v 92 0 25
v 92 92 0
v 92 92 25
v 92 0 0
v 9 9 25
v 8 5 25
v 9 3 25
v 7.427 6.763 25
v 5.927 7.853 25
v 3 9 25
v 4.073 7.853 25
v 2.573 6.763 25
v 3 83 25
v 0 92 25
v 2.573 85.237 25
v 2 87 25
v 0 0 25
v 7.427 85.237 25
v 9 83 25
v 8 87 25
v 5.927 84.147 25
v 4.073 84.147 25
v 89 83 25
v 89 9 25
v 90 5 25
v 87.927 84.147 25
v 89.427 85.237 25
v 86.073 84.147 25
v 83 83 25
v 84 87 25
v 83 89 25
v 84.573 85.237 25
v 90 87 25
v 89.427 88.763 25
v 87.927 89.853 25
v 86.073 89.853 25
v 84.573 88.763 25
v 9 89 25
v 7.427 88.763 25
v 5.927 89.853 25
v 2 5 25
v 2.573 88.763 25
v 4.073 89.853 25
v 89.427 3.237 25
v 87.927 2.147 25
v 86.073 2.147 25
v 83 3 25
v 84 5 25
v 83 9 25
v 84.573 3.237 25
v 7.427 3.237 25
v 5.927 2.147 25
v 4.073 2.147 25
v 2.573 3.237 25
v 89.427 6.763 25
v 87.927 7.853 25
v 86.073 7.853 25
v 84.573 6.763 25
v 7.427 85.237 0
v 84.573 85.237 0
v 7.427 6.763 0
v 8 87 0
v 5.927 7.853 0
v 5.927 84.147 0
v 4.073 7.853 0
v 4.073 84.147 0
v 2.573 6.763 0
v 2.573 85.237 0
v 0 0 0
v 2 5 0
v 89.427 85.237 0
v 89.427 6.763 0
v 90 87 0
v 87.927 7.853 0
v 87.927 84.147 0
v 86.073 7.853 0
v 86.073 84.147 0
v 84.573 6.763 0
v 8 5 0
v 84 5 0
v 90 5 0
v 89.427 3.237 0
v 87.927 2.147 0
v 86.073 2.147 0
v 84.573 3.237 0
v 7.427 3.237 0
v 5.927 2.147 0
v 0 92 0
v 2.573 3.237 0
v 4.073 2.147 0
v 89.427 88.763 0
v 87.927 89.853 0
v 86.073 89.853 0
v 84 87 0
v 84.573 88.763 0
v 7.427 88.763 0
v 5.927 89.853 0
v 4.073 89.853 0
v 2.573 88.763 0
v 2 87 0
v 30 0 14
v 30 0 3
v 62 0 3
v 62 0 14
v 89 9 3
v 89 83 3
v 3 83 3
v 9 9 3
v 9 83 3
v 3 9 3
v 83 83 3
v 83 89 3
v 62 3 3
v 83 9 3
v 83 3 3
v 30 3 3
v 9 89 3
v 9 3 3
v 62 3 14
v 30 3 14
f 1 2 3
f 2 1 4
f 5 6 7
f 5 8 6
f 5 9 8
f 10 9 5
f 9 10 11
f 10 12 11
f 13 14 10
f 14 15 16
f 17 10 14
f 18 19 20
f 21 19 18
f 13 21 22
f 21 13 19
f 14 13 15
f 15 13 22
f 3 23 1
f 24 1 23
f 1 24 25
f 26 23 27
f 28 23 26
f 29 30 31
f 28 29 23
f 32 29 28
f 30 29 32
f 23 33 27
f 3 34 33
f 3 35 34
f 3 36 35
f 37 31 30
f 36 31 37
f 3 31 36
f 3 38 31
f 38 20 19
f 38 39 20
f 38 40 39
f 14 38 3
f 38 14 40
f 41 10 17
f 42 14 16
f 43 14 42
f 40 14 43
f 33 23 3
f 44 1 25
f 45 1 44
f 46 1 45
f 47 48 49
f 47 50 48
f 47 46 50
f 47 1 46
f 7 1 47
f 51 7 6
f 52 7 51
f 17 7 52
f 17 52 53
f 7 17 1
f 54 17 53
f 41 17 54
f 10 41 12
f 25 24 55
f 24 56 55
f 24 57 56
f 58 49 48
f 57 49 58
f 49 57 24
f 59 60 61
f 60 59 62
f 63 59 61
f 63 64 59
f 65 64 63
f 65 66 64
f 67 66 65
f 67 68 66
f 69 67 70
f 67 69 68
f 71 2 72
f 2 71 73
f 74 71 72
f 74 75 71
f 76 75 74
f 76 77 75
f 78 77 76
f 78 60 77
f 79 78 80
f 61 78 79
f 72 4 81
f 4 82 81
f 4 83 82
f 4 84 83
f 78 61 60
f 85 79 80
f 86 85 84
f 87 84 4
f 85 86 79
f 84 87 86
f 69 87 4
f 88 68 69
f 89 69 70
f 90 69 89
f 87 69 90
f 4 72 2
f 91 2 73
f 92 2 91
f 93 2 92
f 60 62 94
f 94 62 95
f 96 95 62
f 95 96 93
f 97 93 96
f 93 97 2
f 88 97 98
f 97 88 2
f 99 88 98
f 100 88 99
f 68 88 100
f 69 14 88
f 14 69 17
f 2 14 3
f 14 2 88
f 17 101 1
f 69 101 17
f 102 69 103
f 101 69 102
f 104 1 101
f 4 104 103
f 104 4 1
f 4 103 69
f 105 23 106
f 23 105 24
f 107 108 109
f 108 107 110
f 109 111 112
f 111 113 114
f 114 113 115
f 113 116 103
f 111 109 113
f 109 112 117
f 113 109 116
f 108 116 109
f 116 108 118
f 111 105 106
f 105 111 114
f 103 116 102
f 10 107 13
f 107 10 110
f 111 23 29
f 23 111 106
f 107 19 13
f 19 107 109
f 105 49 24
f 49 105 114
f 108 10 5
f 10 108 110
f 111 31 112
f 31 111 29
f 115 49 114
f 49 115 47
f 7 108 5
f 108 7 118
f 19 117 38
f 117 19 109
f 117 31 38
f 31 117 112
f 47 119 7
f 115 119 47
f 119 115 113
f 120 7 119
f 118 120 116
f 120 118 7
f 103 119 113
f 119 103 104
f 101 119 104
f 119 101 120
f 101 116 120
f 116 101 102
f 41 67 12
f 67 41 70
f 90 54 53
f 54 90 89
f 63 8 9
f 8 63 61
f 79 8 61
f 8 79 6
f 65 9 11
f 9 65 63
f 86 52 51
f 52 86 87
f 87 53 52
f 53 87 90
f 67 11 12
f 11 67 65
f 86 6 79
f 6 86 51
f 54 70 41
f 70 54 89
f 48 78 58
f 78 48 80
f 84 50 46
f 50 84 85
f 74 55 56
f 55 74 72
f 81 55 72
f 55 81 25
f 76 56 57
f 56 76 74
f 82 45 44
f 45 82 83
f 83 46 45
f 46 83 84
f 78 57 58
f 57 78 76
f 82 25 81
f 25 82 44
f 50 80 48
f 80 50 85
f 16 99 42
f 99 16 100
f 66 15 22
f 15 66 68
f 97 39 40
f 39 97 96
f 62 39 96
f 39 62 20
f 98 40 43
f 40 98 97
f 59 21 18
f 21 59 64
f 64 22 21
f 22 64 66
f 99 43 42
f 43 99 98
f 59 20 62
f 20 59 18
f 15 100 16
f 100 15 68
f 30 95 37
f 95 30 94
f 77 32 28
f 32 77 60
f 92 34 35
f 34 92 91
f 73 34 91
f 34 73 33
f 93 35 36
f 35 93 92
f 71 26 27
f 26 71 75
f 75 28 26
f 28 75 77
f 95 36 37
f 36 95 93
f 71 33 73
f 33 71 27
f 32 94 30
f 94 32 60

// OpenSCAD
ScrewOffset = 5;
ScrewHole = 3;

BoxEdge = 92;
BoxHeight = 25;
BoxEdgethickness = 3;

//BoxEdgethickness = ScrewOffset + 3;
VentWidgh = 32;
VentHeight = 11;
VentCenter = (BoxEdge - VentWidgh)/2;

boxscrew0 = ScrewOffset;
boxscrew1 = BoxEdge - ScrewOffset;

difference (){
    //cube([x,y,z], center = true/false);
    cube([BoxEdge,BoxEdge,BoxHeight], center=false);

    //Remove the following shapes
    //Translates (moves) its child elements along the specified vector. The argument name is optional.
    //    translate([x, y, z]) { ... }
        translate ([BoxEdgethickness,BoxEdgethickness*3,BoxEdgethickness])
            cube([BoxEdge - (BoxEdgethickness*2),BoxEdge - (BoxEdgethickness*6),30], center=false);
        translate ([BoxEdgethickness*3,BoxEdgethickness,BoxEdgethickness])
            cube([BoxEdge - (BoxEdgethickness*6),BoxEdge - (BoxEdgethickness*2),30], center=false);
        //vent hole
        translate([VentCenter,0,BoxEdgethickness])
            cube([VentWidgh,20,VentHeight]);
        //Screw holes        
        translate([boxscrew0,boxscrew0,-3])
            cylinder(BoxHeight+5,ScrewHole,ScrewHole,center=false);
        translate([boxscrew1,boxscrew0,-3])
            cylinder(BoxHeight+5,ScrewHole,ScrewHole,center=false);
        translate([boxscrew0,boxscrew1,-3])
            cylinder(BoxHeight+5,ScrewHole,ScrewHole,center=false);
        translate([boxscrew1,boxscrew1,-3])
            cylinder(BoxHeight+5,ScrewHole,ScrewHole,center=false);
}
